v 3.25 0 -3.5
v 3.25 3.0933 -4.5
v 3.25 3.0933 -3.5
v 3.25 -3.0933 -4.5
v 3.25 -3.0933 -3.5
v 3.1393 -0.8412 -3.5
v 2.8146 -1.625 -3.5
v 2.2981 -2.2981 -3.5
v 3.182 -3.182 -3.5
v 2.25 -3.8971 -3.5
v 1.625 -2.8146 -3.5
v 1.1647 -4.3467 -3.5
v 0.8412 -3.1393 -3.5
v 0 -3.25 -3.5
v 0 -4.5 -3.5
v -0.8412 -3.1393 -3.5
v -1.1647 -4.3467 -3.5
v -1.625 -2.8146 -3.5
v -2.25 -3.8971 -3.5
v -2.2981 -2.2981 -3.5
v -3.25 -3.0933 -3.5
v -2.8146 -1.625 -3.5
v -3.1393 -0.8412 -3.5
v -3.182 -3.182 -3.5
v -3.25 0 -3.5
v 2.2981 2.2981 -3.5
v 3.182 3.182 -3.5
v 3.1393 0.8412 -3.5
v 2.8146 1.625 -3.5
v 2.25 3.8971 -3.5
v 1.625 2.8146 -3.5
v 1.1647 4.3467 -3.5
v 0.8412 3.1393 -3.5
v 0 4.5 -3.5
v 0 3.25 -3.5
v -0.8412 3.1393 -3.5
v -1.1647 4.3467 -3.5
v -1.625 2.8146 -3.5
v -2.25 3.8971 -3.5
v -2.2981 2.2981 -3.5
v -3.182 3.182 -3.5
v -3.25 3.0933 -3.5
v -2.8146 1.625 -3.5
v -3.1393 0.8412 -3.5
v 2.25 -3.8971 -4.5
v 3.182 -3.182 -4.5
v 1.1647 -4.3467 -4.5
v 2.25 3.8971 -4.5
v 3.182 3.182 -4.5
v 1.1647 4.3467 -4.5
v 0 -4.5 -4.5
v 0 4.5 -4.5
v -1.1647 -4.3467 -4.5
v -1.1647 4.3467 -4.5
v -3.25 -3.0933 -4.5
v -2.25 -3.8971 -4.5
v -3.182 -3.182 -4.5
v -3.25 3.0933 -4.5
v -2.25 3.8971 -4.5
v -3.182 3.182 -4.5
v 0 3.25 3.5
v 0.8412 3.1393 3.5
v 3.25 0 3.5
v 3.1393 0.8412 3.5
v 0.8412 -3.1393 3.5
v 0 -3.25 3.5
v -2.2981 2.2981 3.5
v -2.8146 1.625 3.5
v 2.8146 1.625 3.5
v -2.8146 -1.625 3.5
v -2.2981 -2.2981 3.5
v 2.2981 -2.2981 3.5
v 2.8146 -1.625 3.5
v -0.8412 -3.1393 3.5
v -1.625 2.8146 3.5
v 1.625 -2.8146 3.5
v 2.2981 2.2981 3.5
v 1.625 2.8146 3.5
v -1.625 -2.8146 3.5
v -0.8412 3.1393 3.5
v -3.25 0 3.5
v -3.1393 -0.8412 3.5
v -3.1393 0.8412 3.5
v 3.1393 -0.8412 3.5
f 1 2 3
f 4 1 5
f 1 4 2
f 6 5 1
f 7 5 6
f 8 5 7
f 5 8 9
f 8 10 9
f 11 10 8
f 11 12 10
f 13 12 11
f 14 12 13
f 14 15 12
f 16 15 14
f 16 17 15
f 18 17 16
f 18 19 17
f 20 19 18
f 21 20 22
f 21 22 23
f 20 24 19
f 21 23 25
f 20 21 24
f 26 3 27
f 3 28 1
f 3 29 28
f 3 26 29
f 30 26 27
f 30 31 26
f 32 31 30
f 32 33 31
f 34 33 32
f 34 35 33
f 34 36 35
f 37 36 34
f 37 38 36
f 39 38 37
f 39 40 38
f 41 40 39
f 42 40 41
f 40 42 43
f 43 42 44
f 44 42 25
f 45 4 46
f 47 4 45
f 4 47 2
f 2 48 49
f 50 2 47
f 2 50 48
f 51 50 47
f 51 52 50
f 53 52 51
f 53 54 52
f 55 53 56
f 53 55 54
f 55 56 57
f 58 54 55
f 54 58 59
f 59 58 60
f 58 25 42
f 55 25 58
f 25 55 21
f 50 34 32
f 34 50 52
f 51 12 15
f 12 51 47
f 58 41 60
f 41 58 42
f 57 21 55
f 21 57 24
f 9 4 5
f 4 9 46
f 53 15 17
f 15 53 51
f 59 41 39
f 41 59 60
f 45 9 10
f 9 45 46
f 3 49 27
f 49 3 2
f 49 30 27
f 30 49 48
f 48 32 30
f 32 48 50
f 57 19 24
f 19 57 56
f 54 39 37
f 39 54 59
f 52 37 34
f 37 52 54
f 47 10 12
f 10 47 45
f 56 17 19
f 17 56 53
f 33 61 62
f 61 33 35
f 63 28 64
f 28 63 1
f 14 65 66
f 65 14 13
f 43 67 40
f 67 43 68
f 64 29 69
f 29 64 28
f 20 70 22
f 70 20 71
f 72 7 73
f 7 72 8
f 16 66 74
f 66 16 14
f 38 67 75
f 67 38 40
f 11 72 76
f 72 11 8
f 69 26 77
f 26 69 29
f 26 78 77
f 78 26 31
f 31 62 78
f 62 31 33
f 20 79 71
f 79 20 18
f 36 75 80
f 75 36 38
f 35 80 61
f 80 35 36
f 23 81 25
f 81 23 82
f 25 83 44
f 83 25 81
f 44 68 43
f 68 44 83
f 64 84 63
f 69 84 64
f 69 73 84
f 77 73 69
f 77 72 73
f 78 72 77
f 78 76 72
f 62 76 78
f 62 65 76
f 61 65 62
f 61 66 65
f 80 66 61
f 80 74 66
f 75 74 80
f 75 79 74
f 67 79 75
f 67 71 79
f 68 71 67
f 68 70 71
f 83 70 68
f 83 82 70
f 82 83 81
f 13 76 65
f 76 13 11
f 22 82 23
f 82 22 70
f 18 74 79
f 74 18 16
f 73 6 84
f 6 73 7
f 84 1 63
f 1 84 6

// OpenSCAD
button_cap();

module button_cap() {
    cylinder(r = 6.5/2, h = 7, $fn = 24, center = true);
    translate([0,0,-4]) intersection() {
        cube([6.5,20,1], center = true);
        cylinder(r = 9/2, h = 1, $fn = 24, center = true);
    }
}

module front() {
	difference() {
		difference() {
			union() {
				cube([107,62,2], center = true);
				
				translate([99/2-40,-55/2+18,-3]) union() {
					translate([75/2,31/2,0]) cylinder(r = 7/2, h = 4, $fn = 16, center = true);
					translate([75/2,-31/2,0]) cylinder(r = 7/2, h = 4, $fn = 16, center = true);
					translate([-75/2,31/2,0]) cylinder(r = 7/2, h = 4, $fn = 16, center = true);
					translate([-75/2,-31/2,0]) cylinder(r = 7/2, h = 4, $fn = 16, center = true);
				}
				
				translate([0,55/2-8,-4.5]) union() {
					translate([15.25,0,0]) cylinder(r = 6.75/2, h = 7, $fn = 16, center = true);
					translate([-15.25,0,0]) cylinder(r = 6.75/2, h = 7, $fn = 16, center = true);
				}
			}

			translate([99/2-40,-55/2+18,-6]) scale([1.015,1.03,1]) lcd();
			translate([99/2-8,55/2-8,-6.5]) rotate([0,0,90]) scale([1.025,1.025,1]) pot();
			translate([-99/2+9.5,55/2-29/2,2.5]) rotate([0,0,90]) scale([1.025,1.025,1]) din();
			translate([-99/2+9.5,-55/2+29/2,-6]) cube([8.75,14,100], center = true);
		}	
		
		translate([99/2-40,-55/2+18,-3]) union() {
			translate([75/2,31/2,0]) cylinder(r = 3/2, h = 10, $fn = 16, center = true);
			translate([75/2,-31/2,0]) cylinder(r = 3/2, h = 10, $fn = 16, center = true);
			translate([-75/2,31/2,0]) cylinder(r = 3/2, h = 10, $fn = 16, center = true);
			translate([-75/2,-31/2,0]) cylinder(r = 3/2, h = 10, $fn = 16, center = true);
		}
		
		translate([0,55/2-8,0]) union() {
			translate([8,0,0]) cylinder(r = 7.5/2, h = 20, $fn = 16, center = true);
			translate([-8,0,0]) cylinder(r = 7.5/2, h = 20, $fn = 16, center = true);
		}
		
		translate([0,55/2-8,-4.5]) union() {
			translate([15.25,0,0]) cylinder(r = 3/2, h = 20, $fn = 16, center = true);
			translate([-15.25,0,0]) cylinder(r = 3/2, h = 20, $fn = 16, center = true);
		}
		
		translate([-99/2+9.5,55/2-29/2,2.5]) rotate([0,0,90]) union() {
			translate([11.75,0,0]) cylinder(r = 3.5/2, h = 20, $fn = 16, center = true);
			translate([-11.75,0,0]) cylinder(r = 3.5/2, h = 20, $fn = 16, center = true);
		}
	}
	
	/*translate([99/2-40,-55/2+18,-6]) lcd();
	translate([99/2-8,55/2-8,-6.5]) rotate([0,0,90]) pot();
	translate([-99/2+9.5,55/2-29/2,2.5]) rotate([0,0,90]) din();
	translate([-99/2+9.5,-55/2+29/2,-6]) rotate([0,0,90]) power_switch();
	translate([0,55/2-8,-9]) button();*/
}

module button() {
	color([0,0.7,0]) difference() {
		cube([40,9.5,2], center = true);
		
		translate([15.25,0,0]) cylinder(r = 3.5/2, h = 10, $fn = 16, center = true);
		translate([-15.25,0,0]) cylinder(r = 3.5/2, h = 10, $fn = 16, center = true);
	}
	
	color([0.2,0.2,0.2]) translate([8,0,3.75]) cylinder(r = 6.5/2, h = 5.5, $fn = 16, center = true);
	color([0.2,0.2,0.2]) translate([-8,0,3.75]) cylinder(r = 6.5/2, h = 5.5, $fn = 16, center = true);
}

module back() {
	difference() {
		cube([107,62,2], center = true);

		//hex grid
		translate([-54,-7.5,-2]) union() {
			intersection() {
				union() {
					translate([8,10,0]) for (j = [0 : 6]) {
						for (i = [0 : 3]) {
							translate([14.9*j,9*i,-1]) cylinder(r=4, h=5, $fn=6);
						}
					}
					
					translate([15.4,5.7,0]) for (j = [0 : 6]) {
						for (i = [0 : 3]) {
							translate([14.9*j,9*i,-1]) cylinder(r=4, h=5, $fn=6);
						}
					}
				}
				
				translate([9,6,0]) cube([90,25,20]);
			}
		}
		
		translate([-36,-13.5,0]) cube([12,15,5], center = true);
	}
}

module top() {
	difference() {
		translate([0,-39,0]) difference() {
			cube([110,85,65], center = true);
			difference() {
				cube([103,100,58], center = true);
				translate([0,20,0]) cylinder(r = 4, h = 100, $fn = 24, center = true);
			}
			translate([0,0,50]) cube([120,100,65], center = true);
			
			translate([0,20,35]) cylinder(r = 2.8/2, h = 70, $fn = 24, center = true);
		}
		
		cube([108,2.5,63], center = true);
		translate([0,-78,0]) cube([108,2.5,63], center = true);
		
		translate([75,-9,-50]) cube([70,3,60], center = true);
		translate([75,-29,-50]) cube([70,3,60], center = true);
		translate([75,-49,-50]) cube([70,3,60], center = true);
		translate([75,-69,-50]) cube([70,3,60], center = true);
		
		translate([-75,-9,-50]) cube([70,3,60], center = true);
		translate([-75,-29,-50]) cube([70,3,60], center = true);
		translate([-75,-49,-50]) cube([70,3,60], center = true);
		translate([-75,-69,-50]) cube([70,3,60], center = true);
		
		translate([0,-40,-10]) rotate([0,90,0]) cylinder(r = 5/2, h = 150, $fn = 16, center = true);
	}


	difference() {
		translate([-53.25,-39,17]) cube([7,70,7], center = true);
		translate([-30.5,-39,0]) rotate([0,30,0]) cube([50,75,50], center = true);
		translate([-76,-39,0]) rotate([0,-30,0]) cube([50,75,50], center = true);
		translate([-53.25,-39,21]) cube([4,72,7], center = true);
	}

	difference() {
		translate([53.25,-39,17]) cube([7,70,7], center = true);
		translate([30.5,-39,0]) rotate([0,-30,0]) cube([50,75,50], center = true);
		translate([76,-39,0]) rotate([0,30,0]) cube([50,75,50], center = true);
		translate([53.25,-39,21]) cube([4,72,7], center = true);
	}
}

module bottom() {
	translate([0,-51,-25]) difference() {
		union() {
			translate([47,22,0]) cylinder(r = 7/2, h = 8, $fn = 12, center = true);
			translate([47,-22,0]) cylinder(r = 7/2, h = 8, $fn = 12, center = true);
			translate([-47,22,0]) cylinder(r = 7/2, h = 8, $fn = 12, center = true);
			translate([-47,-22,0]) cylinder(r = 7/2, h = 8, $fn = 12, center = true);
		}
		
		translate([47,22,0]) cylinder(r = 3/2, h = 15, $fn = 12, center = true);
		translate([47,-22,0]) cylinder(r = 3/2, h = 15, $fn = 12, center = true);
		translate([-47,22,0]) cylinder(r = 3/2, h = 15, $fn = 12, center = true);
		translate([-47,-22,0]) cylinder(r = 3/2, h = 15, $fn = 12, center = true);
	}

	difference() {
		translate([0,-39,0]) difference() {
			cube([110,85,65], center = true);
			difference() {
				cube([103,100,58], center = true);
				translate([0,20,0]) cylinder(r = 4, h = 100, $fn = 24, center = true);
			}
			translate([0,0,15]) cube([120,100,65], center = true);
			
			translate([0,20,6.8]) cylinder(r = 3.5/2, h = 70, $fn = 24, center = true);
			translate([0,20,-31]) cylinder(r = 6.5/2, h = 5, $fn = 24, center = true);
		}
		
		cube([108,2.5,63], center = true);
		translate([0,-78,0]) cube([108,2.5,63], center = true);
		
		translate([0,-9,0]) cube([70,3,100], center = true);
		translate([0,-29,0]) cube([70,3,100], center = true);
		translate([0,-49,0]) cube([70,3,100], center = true);
		translate([0,-69,0]) cube([70,3,100], center = true);
	}
}

module lcd() {
	difference() {
		union() {
			color([0,0.7,0]) cube([80,36,2], center = true);
			color([0.15,0.15,0.15]) translate([0,0.75,4.5]) cube([71,24.5,7], center = true);
			color([0.7,0.7,0.7]) translate([-37.5,0,2.5]) cube([5,15,3], center = true);
			color([0.15,0.15,0.15]) translate([12.5,-16.5,2]) cube([40,3,2], center = true);
		}
		
		translate([75/2,31/2,0]) cylinder(r = 3.5/2, h = 5, $fn = 16, center = true);
		translate([75/2,-31/2,0]) cylinder(r = 3.5/2, h = 5, $fn = 16, center = true);
		translate([-75/2,31/2,0]) cylinder(r = 3.5/2, h = 5, $fn = 16, center = true);
		translate([-75/2,-31/2,0]) cylinder(r = 3.5/2, h = 5, $fn = 16, center = true);
	}
}

module pot() {
	union() {
		color([0.8,0.8,0.8]) cylinder(r = 16.25/2, h = 9.5, $fn = 32, center = true);
		color([0.7,0.4,0]) hull() {
			translate([0,0,1.75]) cylinder(r = 16.5/2, h = 2, $fn = 32, center = true);
			translate([0,11.25,1.75]) cube([16.5,1,2], center = true);
		}
		color([0.6,0.6,0.6]) translate([0,0,12.25]) cylinder(r = 7.5/2, h = 15, $fn = 16, center = true);
		color([0.8,0.8,0.8]) translate([0,14.25,1.75]) cube([3.5,5,2], center = true);
		color([0.8,0.8,0.8]) translate([6.5,14.25,1.75]) cube([3.5,5,2], center = true);
		color([0.8,0.8,0.8]) translate([-6.5,14.25,1.75]) cube([3.5,5,2], center = true);
	}
}

module power_switch() {
	color([0,0.5,0.7]) cube([13,8,9.5], center = true);
	color([0.6,0.6,0.6]) translate([0,0,9]) cylinder(r = 6/2, h = 8.5, $fn = 16, center = true);
	color([0.6,0.6,0.6]) translate([2,0,17]) rotate([0,22.5,0]) cylinder(r = 2.5/2, h = 10, $fn = 16, center = true);
	color([0.6,0.6,0.6]) translate([0,0,-6.5]) cube([1,2,3.5], center = true);
	color([0.6,0.6,0.6]) translate([4.5,0,-6.5]) cube([1,2,3.5], center = true);
}

module din() {
	difference() {
		union() {
			color([0.6,0.6,0.6]) hull() {
				cylinder(r = 19/2, h = 2, $fn = 32, center = true);
				translate([11.75,0,0]) cylinder(r = 5/2, h = 2, $fn = 16, center = true);
				translate([-11.75,0,0]) cylinder(r = 5/2, h = 2, $fn = 16, center = true);
			}
			color([0.6,0.6,0.6]) translate([0,0,-6.5]) cylinder(r = 15/2, h = 11, $fn = 32, center = true);
		}
		
		translate([11.75,0,0]) cylinder(r = 3.5/2, h = 5, $fn = 16, center = true);
		translate([-11.75,0,0]) cylinder(r = 3.5/2, h = 5, $fn = 16, center = true);
	}
}
